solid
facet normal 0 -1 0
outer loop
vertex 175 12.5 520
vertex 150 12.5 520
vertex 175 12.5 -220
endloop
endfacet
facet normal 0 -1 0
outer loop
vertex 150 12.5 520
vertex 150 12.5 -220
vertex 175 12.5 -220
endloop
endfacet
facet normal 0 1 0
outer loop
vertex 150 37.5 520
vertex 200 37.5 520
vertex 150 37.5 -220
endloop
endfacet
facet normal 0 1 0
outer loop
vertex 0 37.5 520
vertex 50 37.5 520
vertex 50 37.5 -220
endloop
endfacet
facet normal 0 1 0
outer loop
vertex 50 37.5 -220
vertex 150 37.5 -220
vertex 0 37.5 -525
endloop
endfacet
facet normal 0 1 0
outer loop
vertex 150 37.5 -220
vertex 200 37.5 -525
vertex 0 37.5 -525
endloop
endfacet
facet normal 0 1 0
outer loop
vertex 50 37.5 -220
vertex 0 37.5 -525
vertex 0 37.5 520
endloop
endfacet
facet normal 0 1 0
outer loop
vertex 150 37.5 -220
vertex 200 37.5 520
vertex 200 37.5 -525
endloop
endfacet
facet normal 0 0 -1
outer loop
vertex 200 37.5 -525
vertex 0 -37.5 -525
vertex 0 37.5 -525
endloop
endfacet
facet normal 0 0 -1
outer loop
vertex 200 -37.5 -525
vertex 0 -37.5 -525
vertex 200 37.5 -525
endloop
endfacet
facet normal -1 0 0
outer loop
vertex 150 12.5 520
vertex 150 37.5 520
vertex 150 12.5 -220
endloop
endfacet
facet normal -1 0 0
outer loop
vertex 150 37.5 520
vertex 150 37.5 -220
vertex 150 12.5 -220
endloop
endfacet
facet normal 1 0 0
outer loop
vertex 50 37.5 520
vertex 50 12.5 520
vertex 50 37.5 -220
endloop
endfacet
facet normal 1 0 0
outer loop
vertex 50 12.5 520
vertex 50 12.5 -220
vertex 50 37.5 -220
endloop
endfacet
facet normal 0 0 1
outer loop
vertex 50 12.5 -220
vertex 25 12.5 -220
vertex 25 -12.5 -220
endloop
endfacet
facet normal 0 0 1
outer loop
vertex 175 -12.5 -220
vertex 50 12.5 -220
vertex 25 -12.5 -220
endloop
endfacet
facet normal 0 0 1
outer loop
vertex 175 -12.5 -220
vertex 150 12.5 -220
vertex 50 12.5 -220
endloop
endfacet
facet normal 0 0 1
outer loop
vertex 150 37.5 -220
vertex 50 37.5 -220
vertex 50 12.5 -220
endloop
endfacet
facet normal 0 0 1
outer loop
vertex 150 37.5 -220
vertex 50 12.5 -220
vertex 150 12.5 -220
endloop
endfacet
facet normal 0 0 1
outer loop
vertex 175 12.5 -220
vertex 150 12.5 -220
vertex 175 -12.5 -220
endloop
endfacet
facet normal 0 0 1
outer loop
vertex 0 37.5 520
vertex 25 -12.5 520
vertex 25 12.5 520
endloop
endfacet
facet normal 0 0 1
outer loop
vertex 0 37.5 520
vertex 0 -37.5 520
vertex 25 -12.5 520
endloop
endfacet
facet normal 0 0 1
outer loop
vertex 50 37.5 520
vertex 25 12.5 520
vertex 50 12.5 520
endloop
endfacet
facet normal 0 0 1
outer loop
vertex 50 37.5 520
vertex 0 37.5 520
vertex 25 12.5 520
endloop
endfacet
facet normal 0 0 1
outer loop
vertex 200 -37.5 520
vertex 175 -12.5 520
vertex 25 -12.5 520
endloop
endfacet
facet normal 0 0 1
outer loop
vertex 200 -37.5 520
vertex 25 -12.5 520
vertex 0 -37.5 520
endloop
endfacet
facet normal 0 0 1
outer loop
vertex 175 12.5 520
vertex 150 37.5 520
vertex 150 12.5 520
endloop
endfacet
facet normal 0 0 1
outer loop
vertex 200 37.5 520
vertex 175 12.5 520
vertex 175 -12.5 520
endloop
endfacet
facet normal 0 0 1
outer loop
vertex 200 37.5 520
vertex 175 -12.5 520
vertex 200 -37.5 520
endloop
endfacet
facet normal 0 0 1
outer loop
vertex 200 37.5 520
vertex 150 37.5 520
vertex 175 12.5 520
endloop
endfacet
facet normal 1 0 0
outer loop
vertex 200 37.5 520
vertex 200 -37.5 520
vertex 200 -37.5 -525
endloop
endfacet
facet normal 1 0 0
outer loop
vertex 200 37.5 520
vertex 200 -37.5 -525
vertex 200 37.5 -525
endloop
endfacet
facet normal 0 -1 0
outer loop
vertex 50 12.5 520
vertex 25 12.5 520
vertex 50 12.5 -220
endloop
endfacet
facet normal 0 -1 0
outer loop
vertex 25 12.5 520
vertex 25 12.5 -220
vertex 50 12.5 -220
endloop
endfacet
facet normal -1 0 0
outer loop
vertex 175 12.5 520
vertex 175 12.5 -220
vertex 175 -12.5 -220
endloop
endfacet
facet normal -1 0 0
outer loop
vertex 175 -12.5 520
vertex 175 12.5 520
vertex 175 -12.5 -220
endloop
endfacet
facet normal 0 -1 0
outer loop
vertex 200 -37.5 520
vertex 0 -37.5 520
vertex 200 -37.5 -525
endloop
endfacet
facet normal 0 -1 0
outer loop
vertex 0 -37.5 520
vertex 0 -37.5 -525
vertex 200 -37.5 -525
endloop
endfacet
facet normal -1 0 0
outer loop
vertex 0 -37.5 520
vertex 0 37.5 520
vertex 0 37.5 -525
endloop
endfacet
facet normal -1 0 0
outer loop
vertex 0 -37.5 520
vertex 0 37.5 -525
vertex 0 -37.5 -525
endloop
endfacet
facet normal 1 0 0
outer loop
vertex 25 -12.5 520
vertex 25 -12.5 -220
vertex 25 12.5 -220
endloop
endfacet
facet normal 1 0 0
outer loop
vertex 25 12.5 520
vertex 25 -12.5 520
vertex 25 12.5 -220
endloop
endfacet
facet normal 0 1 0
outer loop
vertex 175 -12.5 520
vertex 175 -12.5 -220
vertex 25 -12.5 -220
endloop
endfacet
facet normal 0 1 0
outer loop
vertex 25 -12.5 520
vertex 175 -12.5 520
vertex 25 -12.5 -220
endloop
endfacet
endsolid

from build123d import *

# Parameters (mm, degrees)
F0_W     = 75
F0_H     = 610
F1_DEPTH = 200
F2_W     = 25
F2_H     = 25
F3_DEPTH = 525
F4_W     = 200
F4_H     = 75
F5_DEPTH = 220
F7_DEPTH = 215


with BuildPart() as f1:
    # F0 (on Right) → F1 (new body)
    with BuildSketch(Plane.YZ):
        Rectangle(F0_W, F0_H)
    extrude(amount=F1_DEPTH)

    # F2 (on face) → F3 (cut)
    with BuildSketch(Plane.XY.offset(305)):
        Polygon((150, 37.5), (50, 37.5), (50, 12.5), (50, -12.5), (150, -12.5), (150, 12.5), align=None)
        with Locations((37.5, 0)):
            Rectangle(F2_W, F2_H)
        with Locations((162.5, 0)):
            Rectangle(F2_W, F2_H)
    extrude(amount=-F3_DEPTH, mode=Mode.SUBTRACT)

    # F4 (on face) → F5 (join)
    with BuildSketch(Plane(origin=(0, 0, -305), x_dir=(1, 0, 0), z_dir=(0, 0, -1))):
        with Locations((100, 0)):
            Rectangle(F4_W, F4_H)
    extrude(amount=F5_DEPTH)

    # F6 (on face) → F7 (join)
    with BuildSketch(Plane.XY.offset(305)):
        Polygon((25, -12.5), (25, 12.5), (50, 12.5), (50, 37.5), (0, 37.5), (0, -37.5), (200, -37.5), (200, 37.5), (150, 37.5), (150, 12.5), (175, 12.5), (175, -12.5), align=None)
    extrude(amount=F7_DEPTH)


solid = f1.part
